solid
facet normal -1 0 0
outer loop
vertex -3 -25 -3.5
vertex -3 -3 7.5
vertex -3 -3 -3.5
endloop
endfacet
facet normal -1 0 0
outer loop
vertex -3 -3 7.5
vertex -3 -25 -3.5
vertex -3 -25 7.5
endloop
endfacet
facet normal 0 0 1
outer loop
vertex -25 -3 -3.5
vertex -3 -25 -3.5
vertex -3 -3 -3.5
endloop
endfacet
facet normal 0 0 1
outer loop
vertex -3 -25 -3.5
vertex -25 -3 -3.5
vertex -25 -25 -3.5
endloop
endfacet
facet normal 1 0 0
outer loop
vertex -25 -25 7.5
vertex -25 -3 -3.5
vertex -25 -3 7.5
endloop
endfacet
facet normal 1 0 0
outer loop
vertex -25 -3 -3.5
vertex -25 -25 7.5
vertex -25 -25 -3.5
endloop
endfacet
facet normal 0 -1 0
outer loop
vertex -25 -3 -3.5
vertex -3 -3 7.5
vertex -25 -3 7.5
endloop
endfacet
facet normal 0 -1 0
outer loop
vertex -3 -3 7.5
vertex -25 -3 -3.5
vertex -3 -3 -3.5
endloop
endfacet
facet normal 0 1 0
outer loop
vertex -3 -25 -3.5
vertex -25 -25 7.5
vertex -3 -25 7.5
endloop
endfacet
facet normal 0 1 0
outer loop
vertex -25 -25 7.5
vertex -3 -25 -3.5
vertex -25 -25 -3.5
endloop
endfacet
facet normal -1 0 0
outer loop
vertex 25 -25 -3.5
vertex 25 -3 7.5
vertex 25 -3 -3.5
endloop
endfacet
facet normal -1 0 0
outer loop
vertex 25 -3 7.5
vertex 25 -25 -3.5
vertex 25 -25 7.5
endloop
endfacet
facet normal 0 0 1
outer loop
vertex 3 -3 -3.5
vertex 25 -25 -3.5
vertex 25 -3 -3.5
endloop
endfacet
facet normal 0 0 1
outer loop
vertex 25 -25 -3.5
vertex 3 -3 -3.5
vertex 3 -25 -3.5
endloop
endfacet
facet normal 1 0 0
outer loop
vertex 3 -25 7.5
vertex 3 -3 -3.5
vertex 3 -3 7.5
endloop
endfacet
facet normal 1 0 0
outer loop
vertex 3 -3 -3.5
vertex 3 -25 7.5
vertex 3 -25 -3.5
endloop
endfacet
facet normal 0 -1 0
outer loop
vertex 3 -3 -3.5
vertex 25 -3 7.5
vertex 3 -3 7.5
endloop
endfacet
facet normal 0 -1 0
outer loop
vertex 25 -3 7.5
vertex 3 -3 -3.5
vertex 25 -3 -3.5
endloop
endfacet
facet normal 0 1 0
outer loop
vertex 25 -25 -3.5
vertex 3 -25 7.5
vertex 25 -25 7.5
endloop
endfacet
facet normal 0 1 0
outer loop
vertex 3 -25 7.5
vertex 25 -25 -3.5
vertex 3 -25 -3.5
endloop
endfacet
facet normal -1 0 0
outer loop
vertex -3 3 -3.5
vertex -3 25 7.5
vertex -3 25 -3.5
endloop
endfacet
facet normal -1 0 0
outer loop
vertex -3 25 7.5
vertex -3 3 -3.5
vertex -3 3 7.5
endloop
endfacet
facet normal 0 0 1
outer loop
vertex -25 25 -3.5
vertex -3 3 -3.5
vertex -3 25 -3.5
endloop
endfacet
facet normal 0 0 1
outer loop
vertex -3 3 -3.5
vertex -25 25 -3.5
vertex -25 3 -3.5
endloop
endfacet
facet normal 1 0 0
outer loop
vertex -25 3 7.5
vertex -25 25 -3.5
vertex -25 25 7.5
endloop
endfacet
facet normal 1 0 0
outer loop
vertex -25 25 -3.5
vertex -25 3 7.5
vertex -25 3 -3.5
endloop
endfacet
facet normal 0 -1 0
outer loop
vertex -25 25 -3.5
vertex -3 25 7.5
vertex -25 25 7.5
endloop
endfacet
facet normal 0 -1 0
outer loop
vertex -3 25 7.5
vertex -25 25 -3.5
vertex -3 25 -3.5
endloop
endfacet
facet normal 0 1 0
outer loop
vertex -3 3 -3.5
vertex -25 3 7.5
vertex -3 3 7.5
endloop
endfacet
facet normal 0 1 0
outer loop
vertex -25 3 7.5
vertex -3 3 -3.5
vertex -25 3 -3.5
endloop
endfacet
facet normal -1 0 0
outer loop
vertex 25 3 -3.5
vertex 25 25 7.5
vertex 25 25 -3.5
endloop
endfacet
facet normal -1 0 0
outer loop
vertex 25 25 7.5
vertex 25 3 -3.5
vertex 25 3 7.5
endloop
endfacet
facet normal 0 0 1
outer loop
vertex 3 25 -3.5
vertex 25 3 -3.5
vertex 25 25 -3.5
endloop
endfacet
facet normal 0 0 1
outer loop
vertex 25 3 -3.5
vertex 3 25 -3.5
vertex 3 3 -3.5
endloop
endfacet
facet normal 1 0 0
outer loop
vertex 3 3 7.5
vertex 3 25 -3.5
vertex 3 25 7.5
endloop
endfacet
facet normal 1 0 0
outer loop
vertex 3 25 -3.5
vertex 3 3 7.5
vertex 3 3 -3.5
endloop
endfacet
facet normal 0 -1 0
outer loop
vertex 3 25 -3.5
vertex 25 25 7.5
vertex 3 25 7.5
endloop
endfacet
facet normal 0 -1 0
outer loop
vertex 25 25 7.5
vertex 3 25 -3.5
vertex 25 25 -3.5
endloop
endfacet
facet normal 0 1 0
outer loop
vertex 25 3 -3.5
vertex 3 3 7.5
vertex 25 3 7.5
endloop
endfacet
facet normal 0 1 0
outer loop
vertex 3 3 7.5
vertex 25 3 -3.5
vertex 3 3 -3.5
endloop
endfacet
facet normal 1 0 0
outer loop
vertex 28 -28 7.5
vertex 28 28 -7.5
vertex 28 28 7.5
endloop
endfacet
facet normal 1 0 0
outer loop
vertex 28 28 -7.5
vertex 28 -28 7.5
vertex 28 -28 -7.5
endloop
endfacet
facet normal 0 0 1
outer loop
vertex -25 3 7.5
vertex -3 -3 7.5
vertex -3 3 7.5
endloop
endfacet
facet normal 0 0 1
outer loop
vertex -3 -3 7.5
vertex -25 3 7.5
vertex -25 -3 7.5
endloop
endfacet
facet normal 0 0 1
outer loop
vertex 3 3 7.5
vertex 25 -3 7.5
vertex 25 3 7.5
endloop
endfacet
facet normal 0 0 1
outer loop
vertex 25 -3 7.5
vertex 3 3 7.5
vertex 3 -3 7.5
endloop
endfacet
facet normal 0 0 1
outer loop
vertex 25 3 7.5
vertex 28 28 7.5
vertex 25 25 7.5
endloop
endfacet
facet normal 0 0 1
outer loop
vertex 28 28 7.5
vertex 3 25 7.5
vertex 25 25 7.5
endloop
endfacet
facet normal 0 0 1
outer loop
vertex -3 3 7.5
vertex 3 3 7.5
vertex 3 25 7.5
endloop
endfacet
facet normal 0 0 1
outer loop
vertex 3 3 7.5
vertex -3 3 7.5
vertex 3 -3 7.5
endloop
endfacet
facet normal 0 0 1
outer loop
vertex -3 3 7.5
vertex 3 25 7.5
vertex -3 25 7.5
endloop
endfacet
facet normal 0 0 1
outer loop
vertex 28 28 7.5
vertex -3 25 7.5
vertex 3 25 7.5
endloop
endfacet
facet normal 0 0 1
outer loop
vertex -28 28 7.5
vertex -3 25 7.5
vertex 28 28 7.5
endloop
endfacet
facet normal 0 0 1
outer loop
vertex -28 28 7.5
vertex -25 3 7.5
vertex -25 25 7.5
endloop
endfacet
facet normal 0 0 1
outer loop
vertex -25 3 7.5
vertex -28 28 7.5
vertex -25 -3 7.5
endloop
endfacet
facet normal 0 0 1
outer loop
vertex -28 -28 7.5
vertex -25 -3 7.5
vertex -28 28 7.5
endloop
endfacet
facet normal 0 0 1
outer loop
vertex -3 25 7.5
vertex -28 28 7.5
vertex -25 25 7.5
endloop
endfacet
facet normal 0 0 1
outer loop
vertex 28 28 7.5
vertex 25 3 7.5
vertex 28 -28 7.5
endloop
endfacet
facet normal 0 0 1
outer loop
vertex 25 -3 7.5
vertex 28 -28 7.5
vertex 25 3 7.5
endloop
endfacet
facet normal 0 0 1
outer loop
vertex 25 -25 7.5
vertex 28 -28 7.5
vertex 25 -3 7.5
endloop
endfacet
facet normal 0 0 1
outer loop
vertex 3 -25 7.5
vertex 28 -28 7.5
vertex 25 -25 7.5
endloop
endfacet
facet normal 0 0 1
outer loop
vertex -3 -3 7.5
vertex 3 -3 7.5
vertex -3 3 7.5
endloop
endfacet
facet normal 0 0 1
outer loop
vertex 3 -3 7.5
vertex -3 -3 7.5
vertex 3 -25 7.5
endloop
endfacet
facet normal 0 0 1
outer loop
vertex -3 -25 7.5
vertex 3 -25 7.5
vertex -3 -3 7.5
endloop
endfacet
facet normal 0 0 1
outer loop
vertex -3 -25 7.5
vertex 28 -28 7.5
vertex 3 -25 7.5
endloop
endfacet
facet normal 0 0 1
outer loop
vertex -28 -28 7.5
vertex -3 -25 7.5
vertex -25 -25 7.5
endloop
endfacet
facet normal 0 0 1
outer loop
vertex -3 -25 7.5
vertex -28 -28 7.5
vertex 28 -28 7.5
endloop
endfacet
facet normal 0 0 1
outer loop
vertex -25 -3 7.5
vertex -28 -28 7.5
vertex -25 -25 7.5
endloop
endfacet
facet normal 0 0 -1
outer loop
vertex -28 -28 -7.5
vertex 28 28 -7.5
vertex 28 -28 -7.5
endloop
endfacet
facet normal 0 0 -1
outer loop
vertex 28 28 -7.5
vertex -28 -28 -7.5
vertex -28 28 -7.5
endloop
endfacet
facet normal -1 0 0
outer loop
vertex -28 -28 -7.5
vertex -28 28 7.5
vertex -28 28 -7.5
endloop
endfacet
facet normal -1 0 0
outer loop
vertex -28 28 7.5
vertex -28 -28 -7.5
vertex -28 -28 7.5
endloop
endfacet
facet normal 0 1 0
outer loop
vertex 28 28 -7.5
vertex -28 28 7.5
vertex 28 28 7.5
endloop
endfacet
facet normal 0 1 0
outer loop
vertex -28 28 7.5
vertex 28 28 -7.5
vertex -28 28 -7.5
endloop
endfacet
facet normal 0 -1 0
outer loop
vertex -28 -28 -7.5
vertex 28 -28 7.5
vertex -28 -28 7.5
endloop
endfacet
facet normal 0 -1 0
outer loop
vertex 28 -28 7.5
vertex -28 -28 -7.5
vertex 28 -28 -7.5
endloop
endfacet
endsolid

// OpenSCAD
$fn = 32;

// ----------------------------------------------------------------------
// Pocket plate 56 x 56 x 15
// 2 x 2 pockets 22 mm square, 11 mm deep
// ----------------------------------------------------------------------

// --- parameters (mm) ---
thickness = 15;  // plate thickness
floor_t = 4;     // material left under each pocket
pocket = 22;     // pocket side length
pitch_x = 28;    // pocket pitch along X
pitch_y = 28;    // pocket pitch along Y
cols = 2;        // pockets per row
rows = 2;        // rows of pockets

// --- derived feature positions (mm) ---
depth = thickness - floor_t;        // = 11   pocket depth, down to the floor
span_x = (cols - 1) * pitch_x;      // = 28   distance between outer pockets
span_y = (rows - 1) * pitch_y;      // = 28   distance between outer pocket rows
origin_x = -span_x / 2;             // = -14   X of the first pocket
origin_y = -span_y / 2;             // = -14   Y of the first pocket
plate = [span_x + pocket + 6, span_y + pocket + 6, thickness];  // = [56, 56, 15]   overall size: pockets plus 3 mm of wall on each side
feature_centers = [
  [origin_x + 0 * pitch_x, origin_y + 0 * pitch_y],
  [origin_x + 1 * pitch_x, origin_y + 0 * pitch_y],
  [origin_x + 0 * pitch_x, origin_y + 1 * pitch_y],
  [origin_x + 1 * pitch_x, origin_y + 1 * pitch_y]
];   // pocket centres, used verbatim by the cutter loop

// plate outline, then one pocket per centre in feature_centers
difference() {
  cube(plate, center = true);
  for (centre = feature_centers)
    translate([centre[0] - pocket / 2, centre[1] - pocket / 2, plate[2] / 2 - depth])
      cube([pocket, pocket, depth + 1]);  // centred on the declared pocket centre
}
